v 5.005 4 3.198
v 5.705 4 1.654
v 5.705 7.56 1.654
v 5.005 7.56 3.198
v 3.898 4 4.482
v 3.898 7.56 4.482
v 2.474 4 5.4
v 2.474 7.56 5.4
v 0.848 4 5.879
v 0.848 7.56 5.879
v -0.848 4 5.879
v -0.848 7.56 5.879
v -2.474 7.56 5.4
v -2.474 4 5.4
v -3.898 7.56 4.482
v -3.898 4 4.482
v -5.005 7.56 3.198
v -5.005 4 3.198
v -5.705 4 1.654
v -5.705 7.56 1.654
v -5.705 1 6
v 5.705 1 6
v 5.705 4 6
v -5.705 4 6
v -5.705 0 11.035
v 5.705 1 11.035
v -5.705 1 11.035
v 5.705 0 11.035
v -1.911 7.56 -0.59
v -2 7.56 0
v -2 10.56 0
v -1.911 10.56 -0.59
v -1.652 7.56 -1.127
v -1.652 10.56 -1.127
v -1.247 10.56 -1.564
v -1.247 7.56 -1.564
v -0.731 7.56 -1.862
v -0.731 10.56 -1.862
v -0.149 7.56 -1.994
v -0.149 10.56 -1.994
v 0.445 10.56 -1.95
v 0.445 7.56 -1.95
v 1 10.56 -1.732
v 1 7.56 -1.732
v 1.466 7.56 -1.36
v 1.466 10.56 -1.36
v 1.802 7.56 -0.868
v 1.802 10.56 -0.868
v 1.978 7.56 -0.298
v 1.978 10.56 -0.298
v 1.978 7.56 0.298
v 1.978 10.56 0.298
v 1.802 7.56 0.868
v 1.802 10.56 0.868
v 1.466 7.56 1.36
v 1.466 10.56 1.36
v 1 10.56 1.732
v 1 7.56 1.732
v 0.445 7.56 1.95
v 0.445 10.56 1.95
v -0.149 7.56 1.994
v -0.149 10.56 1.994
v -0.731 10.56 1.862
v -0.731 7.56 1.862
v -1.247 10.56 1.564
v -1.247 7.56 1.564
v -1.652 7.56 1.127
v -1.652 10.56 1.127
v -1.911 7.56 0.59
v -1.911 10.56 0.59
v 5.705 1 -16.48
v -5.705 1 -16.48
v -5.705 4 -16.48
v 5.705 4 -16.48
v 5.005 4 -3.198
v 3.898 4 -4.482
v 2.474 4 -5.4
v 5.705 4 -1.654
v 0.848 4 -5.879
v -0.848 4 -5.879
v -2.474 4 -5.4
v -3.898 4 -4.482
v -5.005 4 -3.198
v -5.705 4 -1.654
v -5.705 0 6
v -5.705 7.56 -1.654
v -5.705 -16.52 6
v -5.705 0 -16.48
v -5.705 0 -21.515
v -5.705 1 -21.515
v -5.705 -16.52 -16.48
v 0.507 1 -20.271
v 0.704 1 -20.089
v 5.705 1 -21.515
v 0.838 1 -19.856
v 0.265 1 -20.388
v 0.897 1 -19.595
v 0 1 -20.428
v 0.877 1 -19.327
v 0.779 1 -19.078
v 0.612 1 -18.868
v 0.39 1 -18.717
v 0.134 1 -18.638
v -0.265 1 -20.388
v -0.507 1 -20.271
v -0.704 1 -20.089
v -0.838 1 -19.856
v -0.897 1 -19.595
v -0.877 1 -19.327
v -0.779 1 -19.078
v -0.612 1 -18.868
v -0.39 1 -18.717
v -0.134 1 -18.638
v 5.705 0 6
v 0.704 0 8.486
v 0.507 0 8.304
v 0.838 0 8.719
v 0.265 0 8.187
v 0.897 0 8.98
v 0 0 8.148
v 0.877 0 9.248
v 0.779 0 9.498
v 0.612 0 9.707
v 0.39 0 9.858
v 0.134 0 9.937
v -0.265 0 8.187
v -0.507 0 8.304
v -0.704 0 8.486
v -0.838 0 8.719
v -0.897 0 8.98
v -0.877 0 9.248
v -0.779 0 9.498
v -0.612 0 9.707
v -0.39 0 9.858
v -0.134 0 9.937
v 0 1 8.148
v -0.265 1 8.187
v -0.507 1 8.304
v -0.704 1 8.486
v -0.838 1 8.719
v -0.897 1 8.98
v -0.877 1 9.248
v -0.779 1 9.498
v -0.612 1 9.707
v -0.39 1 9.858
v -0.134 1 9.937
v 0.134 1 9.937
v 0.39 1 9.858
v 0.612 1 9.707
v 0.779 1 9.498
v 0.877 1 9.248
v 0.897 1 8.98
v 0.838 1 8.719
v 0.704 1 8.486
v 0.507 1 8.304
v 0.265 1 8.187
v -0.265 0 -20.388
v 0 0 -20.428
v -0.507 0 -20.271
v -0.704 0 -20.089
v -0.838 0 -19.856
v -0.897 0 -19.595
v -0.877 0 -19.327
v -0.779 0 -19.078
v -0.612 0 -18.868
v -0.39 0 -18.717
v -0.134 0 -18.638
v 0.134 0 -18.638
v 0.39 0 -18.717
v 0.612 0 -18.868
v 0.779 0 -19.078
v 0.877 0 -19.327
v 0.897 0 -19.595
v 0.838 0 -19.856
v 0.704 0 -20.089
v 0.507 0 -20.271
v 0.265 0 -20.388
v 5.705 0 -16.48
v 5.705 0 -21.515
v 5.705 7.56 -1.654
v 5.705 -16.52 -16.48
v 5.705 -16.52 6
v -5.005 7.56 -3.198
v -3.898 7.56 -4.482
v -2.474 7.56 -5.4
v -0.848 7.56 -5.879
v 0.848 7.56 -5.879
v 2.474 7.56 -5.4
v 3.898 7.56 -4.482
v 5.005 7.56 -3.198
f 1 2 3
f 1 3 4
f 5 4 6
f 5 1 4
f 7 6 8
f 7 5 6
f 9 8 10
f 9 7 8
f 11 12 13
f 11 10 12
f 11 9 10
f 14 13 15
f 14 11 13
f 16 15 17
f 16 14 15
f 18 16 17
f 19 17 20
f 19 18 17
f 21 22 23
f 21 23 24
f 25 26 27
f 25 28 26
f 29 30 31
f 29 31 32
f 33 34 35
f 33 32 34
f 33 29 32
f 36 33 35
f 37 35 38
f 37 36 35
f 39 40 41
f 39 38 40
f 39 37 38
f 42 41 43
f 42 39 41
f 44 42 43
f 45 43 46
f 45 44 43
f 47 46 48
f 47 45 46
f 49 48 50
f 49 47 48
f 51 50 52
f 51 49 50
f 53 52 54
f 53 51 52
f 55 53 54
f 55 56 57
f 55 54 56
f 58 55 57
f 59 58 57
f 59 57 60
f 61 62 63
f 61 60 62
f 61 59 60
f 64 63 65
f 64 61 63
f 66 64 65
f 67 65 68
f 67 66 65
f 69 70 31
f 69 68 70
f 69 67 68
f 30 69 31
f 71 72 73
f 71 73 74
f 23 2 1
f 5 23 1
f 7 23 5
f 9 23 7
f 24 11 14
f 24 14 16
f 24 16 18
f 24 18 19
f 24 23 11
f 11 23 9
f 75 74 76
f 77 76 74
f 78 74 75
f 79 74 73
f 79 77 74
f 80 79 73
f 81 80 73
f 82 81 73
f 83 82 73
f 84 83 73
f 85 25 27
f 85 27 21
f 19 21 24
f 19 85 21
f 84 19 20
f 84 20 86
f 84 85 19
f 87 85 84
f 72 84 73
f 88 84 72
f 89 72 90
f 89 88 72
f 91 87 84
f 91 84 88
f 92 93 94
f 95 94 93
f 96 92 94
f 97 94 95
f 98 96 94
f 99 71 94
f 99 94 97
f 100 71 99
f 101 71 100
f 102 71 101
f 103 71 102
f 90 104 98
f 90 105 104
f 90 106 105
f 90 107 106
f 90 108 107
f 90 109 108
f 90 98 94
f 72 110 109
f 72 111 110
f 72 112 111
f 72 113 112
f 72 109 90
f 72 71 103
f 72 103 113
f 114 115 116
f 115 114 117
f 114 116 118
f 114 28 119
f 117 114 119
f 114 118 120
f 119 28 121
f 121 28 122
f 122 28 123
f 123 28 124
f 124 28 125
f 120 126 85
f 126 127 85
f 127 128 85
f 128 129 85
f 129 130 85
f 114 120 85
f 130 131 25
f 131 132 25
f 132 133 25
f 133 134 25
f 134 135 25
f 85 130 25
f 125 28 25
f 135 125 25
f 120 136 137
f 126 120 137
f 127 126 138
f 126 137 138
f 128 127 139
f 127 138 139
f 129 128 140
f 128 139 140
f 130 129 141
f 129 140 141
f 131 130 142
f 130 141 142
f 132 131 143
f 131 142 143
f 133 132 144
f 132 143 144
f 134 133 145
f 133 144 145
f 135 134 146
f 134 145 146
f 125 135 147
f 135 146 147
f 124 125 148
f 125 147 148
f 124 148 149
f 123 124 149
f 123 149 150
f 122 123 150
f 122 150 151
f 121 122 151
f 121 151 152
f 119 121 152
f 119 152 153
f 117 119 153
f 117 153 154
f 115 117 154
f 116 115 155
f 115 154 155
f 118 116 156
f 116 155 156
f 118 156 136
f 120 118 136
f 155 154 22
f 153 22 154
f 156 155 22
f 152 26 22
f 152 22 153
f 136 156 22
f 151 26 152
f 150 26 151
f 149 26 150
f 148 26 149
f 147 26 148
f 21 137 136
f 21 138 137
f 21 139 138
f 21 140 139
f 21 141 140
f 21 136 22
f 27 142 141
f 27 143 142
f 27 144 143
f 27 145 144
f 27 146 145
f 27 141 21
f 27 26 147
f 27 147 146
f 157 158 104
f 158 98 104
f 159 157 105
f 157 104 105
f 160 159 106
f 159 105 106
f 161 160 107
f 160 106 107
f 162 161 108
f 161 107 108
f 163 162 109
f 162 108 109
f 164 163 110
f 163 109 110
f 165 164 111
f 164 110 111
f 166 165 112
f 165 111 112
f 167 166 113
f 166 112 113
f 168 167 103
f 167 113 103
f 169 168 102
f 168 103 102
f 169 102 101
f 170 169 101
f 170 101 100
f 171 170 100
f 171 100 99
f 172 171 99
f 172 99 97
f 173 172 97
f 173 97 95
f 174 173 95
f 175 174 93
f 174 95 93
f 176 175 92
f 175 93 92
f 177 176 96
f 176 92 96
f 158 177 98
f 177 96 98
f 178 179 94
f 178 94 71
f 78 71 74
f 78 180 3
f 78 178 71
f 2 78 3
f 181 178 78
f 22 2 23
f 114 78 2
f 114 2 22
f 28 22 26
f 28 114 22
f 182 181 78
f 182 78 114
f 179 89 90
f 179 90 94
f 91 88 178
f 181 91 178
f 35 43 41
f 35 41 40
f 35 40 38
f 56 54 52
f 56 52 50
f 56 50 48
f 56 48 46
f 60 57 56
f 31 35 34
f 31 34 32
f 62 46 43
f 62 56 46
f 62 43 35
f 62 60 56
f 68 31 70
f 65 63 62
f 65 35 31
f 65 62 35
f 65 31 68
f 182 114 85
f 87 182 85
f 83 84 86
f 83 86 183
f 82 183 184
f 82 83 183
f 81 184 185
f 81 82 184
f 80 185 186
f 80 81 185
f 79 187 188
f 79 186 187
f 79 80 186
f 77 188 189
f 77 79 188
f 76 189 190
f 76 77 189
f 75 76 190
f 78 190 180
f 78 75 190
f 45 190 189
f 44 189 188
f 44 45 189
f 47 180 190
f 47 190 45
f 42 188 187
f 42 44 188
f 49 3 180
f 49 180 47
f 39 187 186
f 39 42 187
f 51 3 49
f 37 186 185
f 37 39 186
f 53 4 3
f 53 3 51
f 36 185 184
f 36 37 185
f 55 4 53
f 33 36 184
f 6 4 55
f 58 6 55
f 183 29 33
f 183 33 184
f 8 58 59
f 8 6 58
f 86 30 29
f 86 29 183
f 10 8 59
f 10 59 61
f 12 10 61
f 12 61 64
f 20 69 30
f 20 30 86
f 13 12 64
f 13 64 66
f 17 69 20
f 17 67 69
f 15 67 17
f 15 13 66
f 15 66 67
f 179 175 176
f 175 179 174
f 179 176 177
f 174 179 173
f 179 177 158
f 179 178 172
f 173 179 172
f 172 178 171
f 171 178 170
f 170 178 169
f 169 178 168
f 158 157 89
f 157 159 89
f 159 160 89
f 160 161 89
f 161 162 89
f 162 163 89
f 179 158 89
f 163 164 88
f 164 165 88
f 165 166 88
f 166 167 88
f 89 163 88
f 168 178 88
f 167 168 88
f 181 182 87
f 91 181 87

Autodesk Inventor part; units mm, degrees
ref_plane "YZ Plane" through (0, 0, 0) normal (1, 0, 0) x (0, 1, 0)
ref_plane "XZ Plane" through (0, 0, 0) normal (0, 1, 0) x (-1, 0, 0)
ref_plane "XY Plane" through (0, 0, 0) normal (0, 0, 1) x (1, 0, 0)
sketch "Sketch1" plane through (0, 0, 0) normal (0, 1, 0) x (-1, 0, 0)
  line L0 (-5.705, 6) -> (5.705, 6)
  line L1 (5.705, 6) -> (5.705, -16.48)
  line L2 (5.705, -16.48) -> (-5.705, -16.48)
  line L3 (-5.705, -16.48) -> (-5.705, 6)
  line L4 (-5.705, 11.035) -> (5.705, 11.035)
  line L5 (5.705, 11.035) -> (5.705, -21.515)
  line L6 (5.705, -21.515) -> (-5.705, -21.515)
  line L7 (-5.705, -21.515) -> (-5.705, 11.035)
  circle A0 centre (0, 0) radius 2
  line L8 (0, 9.0475) -> (0, 11.035) construction
  line L9 (0, -19.5275) -> (0, -21.515) construction
  line L10 (-5.705, 6) -> (-5.705, 11.035) construction
  line L11 (-5.705, -16.48) -> (-5.705, -21.515) construction
  arc A1 (5.705, 1.6543) -> (-5.705, 1.6543) centre (0, 0) ccw
  arc A2 (-5.705, -1.6543) -> (5.705, -1.6543) centre (0, 0) ccw
  line L12 (5.705, 11.035) -> (-5.705, 11.035)
  line L13 (-5.705, 11.035) -> (-5.705, 6)
  line L14 (-5.705, 6) -> (5.705, 6)
  line L15 (5.705, 6) -> (5.705, 11.035)
  line L16 (5.705, -16.48) -> (-5.705, -16.48)
  line L17 (-5.705, -16.48) -> (-5.705, -21.515)
  line L18 (-5.705, -21.515) -> (5.705, -21.515)
  line L19 (5.705, -21.515) -> (5.705, -16.48)
  point P0 (0, 6)
  dimension "d0" = 11.41
  dimension "d8" = 32.55
  dimension "d10" = 4
  dimension "d28" = 22.48
  dimension "d29" = 6
  dimension "d30" = 28.575
  dimension "d31" = 5.94
extrude "Extrusion1" add sketch "Sketch1" along normal blind 4 and the other way blind 16.52 contours L0 L1 A1 L3 | A1 L1 A2 L3 | A2 L1 L2 L3 | A0
extrude "Extrusion5" add sketch "Sketch1" along normal blind 1 contours L7 L4 L5 L0 | L2 L5 L6 L7
extrude "Extrusion3" add sketch "Sketch1" along normal blind 7.56 contours A1 L1 A2 L3
extrude "Extrusion4" add sketch "Sketch1" along normal blind 10.56 contours A0
hole "Hole1" at (0, 0, 9.0475) at (0, 0, -19.5275) direction (0, 1, 0) diameter 1.8 end through all
properties part number "HS55"
